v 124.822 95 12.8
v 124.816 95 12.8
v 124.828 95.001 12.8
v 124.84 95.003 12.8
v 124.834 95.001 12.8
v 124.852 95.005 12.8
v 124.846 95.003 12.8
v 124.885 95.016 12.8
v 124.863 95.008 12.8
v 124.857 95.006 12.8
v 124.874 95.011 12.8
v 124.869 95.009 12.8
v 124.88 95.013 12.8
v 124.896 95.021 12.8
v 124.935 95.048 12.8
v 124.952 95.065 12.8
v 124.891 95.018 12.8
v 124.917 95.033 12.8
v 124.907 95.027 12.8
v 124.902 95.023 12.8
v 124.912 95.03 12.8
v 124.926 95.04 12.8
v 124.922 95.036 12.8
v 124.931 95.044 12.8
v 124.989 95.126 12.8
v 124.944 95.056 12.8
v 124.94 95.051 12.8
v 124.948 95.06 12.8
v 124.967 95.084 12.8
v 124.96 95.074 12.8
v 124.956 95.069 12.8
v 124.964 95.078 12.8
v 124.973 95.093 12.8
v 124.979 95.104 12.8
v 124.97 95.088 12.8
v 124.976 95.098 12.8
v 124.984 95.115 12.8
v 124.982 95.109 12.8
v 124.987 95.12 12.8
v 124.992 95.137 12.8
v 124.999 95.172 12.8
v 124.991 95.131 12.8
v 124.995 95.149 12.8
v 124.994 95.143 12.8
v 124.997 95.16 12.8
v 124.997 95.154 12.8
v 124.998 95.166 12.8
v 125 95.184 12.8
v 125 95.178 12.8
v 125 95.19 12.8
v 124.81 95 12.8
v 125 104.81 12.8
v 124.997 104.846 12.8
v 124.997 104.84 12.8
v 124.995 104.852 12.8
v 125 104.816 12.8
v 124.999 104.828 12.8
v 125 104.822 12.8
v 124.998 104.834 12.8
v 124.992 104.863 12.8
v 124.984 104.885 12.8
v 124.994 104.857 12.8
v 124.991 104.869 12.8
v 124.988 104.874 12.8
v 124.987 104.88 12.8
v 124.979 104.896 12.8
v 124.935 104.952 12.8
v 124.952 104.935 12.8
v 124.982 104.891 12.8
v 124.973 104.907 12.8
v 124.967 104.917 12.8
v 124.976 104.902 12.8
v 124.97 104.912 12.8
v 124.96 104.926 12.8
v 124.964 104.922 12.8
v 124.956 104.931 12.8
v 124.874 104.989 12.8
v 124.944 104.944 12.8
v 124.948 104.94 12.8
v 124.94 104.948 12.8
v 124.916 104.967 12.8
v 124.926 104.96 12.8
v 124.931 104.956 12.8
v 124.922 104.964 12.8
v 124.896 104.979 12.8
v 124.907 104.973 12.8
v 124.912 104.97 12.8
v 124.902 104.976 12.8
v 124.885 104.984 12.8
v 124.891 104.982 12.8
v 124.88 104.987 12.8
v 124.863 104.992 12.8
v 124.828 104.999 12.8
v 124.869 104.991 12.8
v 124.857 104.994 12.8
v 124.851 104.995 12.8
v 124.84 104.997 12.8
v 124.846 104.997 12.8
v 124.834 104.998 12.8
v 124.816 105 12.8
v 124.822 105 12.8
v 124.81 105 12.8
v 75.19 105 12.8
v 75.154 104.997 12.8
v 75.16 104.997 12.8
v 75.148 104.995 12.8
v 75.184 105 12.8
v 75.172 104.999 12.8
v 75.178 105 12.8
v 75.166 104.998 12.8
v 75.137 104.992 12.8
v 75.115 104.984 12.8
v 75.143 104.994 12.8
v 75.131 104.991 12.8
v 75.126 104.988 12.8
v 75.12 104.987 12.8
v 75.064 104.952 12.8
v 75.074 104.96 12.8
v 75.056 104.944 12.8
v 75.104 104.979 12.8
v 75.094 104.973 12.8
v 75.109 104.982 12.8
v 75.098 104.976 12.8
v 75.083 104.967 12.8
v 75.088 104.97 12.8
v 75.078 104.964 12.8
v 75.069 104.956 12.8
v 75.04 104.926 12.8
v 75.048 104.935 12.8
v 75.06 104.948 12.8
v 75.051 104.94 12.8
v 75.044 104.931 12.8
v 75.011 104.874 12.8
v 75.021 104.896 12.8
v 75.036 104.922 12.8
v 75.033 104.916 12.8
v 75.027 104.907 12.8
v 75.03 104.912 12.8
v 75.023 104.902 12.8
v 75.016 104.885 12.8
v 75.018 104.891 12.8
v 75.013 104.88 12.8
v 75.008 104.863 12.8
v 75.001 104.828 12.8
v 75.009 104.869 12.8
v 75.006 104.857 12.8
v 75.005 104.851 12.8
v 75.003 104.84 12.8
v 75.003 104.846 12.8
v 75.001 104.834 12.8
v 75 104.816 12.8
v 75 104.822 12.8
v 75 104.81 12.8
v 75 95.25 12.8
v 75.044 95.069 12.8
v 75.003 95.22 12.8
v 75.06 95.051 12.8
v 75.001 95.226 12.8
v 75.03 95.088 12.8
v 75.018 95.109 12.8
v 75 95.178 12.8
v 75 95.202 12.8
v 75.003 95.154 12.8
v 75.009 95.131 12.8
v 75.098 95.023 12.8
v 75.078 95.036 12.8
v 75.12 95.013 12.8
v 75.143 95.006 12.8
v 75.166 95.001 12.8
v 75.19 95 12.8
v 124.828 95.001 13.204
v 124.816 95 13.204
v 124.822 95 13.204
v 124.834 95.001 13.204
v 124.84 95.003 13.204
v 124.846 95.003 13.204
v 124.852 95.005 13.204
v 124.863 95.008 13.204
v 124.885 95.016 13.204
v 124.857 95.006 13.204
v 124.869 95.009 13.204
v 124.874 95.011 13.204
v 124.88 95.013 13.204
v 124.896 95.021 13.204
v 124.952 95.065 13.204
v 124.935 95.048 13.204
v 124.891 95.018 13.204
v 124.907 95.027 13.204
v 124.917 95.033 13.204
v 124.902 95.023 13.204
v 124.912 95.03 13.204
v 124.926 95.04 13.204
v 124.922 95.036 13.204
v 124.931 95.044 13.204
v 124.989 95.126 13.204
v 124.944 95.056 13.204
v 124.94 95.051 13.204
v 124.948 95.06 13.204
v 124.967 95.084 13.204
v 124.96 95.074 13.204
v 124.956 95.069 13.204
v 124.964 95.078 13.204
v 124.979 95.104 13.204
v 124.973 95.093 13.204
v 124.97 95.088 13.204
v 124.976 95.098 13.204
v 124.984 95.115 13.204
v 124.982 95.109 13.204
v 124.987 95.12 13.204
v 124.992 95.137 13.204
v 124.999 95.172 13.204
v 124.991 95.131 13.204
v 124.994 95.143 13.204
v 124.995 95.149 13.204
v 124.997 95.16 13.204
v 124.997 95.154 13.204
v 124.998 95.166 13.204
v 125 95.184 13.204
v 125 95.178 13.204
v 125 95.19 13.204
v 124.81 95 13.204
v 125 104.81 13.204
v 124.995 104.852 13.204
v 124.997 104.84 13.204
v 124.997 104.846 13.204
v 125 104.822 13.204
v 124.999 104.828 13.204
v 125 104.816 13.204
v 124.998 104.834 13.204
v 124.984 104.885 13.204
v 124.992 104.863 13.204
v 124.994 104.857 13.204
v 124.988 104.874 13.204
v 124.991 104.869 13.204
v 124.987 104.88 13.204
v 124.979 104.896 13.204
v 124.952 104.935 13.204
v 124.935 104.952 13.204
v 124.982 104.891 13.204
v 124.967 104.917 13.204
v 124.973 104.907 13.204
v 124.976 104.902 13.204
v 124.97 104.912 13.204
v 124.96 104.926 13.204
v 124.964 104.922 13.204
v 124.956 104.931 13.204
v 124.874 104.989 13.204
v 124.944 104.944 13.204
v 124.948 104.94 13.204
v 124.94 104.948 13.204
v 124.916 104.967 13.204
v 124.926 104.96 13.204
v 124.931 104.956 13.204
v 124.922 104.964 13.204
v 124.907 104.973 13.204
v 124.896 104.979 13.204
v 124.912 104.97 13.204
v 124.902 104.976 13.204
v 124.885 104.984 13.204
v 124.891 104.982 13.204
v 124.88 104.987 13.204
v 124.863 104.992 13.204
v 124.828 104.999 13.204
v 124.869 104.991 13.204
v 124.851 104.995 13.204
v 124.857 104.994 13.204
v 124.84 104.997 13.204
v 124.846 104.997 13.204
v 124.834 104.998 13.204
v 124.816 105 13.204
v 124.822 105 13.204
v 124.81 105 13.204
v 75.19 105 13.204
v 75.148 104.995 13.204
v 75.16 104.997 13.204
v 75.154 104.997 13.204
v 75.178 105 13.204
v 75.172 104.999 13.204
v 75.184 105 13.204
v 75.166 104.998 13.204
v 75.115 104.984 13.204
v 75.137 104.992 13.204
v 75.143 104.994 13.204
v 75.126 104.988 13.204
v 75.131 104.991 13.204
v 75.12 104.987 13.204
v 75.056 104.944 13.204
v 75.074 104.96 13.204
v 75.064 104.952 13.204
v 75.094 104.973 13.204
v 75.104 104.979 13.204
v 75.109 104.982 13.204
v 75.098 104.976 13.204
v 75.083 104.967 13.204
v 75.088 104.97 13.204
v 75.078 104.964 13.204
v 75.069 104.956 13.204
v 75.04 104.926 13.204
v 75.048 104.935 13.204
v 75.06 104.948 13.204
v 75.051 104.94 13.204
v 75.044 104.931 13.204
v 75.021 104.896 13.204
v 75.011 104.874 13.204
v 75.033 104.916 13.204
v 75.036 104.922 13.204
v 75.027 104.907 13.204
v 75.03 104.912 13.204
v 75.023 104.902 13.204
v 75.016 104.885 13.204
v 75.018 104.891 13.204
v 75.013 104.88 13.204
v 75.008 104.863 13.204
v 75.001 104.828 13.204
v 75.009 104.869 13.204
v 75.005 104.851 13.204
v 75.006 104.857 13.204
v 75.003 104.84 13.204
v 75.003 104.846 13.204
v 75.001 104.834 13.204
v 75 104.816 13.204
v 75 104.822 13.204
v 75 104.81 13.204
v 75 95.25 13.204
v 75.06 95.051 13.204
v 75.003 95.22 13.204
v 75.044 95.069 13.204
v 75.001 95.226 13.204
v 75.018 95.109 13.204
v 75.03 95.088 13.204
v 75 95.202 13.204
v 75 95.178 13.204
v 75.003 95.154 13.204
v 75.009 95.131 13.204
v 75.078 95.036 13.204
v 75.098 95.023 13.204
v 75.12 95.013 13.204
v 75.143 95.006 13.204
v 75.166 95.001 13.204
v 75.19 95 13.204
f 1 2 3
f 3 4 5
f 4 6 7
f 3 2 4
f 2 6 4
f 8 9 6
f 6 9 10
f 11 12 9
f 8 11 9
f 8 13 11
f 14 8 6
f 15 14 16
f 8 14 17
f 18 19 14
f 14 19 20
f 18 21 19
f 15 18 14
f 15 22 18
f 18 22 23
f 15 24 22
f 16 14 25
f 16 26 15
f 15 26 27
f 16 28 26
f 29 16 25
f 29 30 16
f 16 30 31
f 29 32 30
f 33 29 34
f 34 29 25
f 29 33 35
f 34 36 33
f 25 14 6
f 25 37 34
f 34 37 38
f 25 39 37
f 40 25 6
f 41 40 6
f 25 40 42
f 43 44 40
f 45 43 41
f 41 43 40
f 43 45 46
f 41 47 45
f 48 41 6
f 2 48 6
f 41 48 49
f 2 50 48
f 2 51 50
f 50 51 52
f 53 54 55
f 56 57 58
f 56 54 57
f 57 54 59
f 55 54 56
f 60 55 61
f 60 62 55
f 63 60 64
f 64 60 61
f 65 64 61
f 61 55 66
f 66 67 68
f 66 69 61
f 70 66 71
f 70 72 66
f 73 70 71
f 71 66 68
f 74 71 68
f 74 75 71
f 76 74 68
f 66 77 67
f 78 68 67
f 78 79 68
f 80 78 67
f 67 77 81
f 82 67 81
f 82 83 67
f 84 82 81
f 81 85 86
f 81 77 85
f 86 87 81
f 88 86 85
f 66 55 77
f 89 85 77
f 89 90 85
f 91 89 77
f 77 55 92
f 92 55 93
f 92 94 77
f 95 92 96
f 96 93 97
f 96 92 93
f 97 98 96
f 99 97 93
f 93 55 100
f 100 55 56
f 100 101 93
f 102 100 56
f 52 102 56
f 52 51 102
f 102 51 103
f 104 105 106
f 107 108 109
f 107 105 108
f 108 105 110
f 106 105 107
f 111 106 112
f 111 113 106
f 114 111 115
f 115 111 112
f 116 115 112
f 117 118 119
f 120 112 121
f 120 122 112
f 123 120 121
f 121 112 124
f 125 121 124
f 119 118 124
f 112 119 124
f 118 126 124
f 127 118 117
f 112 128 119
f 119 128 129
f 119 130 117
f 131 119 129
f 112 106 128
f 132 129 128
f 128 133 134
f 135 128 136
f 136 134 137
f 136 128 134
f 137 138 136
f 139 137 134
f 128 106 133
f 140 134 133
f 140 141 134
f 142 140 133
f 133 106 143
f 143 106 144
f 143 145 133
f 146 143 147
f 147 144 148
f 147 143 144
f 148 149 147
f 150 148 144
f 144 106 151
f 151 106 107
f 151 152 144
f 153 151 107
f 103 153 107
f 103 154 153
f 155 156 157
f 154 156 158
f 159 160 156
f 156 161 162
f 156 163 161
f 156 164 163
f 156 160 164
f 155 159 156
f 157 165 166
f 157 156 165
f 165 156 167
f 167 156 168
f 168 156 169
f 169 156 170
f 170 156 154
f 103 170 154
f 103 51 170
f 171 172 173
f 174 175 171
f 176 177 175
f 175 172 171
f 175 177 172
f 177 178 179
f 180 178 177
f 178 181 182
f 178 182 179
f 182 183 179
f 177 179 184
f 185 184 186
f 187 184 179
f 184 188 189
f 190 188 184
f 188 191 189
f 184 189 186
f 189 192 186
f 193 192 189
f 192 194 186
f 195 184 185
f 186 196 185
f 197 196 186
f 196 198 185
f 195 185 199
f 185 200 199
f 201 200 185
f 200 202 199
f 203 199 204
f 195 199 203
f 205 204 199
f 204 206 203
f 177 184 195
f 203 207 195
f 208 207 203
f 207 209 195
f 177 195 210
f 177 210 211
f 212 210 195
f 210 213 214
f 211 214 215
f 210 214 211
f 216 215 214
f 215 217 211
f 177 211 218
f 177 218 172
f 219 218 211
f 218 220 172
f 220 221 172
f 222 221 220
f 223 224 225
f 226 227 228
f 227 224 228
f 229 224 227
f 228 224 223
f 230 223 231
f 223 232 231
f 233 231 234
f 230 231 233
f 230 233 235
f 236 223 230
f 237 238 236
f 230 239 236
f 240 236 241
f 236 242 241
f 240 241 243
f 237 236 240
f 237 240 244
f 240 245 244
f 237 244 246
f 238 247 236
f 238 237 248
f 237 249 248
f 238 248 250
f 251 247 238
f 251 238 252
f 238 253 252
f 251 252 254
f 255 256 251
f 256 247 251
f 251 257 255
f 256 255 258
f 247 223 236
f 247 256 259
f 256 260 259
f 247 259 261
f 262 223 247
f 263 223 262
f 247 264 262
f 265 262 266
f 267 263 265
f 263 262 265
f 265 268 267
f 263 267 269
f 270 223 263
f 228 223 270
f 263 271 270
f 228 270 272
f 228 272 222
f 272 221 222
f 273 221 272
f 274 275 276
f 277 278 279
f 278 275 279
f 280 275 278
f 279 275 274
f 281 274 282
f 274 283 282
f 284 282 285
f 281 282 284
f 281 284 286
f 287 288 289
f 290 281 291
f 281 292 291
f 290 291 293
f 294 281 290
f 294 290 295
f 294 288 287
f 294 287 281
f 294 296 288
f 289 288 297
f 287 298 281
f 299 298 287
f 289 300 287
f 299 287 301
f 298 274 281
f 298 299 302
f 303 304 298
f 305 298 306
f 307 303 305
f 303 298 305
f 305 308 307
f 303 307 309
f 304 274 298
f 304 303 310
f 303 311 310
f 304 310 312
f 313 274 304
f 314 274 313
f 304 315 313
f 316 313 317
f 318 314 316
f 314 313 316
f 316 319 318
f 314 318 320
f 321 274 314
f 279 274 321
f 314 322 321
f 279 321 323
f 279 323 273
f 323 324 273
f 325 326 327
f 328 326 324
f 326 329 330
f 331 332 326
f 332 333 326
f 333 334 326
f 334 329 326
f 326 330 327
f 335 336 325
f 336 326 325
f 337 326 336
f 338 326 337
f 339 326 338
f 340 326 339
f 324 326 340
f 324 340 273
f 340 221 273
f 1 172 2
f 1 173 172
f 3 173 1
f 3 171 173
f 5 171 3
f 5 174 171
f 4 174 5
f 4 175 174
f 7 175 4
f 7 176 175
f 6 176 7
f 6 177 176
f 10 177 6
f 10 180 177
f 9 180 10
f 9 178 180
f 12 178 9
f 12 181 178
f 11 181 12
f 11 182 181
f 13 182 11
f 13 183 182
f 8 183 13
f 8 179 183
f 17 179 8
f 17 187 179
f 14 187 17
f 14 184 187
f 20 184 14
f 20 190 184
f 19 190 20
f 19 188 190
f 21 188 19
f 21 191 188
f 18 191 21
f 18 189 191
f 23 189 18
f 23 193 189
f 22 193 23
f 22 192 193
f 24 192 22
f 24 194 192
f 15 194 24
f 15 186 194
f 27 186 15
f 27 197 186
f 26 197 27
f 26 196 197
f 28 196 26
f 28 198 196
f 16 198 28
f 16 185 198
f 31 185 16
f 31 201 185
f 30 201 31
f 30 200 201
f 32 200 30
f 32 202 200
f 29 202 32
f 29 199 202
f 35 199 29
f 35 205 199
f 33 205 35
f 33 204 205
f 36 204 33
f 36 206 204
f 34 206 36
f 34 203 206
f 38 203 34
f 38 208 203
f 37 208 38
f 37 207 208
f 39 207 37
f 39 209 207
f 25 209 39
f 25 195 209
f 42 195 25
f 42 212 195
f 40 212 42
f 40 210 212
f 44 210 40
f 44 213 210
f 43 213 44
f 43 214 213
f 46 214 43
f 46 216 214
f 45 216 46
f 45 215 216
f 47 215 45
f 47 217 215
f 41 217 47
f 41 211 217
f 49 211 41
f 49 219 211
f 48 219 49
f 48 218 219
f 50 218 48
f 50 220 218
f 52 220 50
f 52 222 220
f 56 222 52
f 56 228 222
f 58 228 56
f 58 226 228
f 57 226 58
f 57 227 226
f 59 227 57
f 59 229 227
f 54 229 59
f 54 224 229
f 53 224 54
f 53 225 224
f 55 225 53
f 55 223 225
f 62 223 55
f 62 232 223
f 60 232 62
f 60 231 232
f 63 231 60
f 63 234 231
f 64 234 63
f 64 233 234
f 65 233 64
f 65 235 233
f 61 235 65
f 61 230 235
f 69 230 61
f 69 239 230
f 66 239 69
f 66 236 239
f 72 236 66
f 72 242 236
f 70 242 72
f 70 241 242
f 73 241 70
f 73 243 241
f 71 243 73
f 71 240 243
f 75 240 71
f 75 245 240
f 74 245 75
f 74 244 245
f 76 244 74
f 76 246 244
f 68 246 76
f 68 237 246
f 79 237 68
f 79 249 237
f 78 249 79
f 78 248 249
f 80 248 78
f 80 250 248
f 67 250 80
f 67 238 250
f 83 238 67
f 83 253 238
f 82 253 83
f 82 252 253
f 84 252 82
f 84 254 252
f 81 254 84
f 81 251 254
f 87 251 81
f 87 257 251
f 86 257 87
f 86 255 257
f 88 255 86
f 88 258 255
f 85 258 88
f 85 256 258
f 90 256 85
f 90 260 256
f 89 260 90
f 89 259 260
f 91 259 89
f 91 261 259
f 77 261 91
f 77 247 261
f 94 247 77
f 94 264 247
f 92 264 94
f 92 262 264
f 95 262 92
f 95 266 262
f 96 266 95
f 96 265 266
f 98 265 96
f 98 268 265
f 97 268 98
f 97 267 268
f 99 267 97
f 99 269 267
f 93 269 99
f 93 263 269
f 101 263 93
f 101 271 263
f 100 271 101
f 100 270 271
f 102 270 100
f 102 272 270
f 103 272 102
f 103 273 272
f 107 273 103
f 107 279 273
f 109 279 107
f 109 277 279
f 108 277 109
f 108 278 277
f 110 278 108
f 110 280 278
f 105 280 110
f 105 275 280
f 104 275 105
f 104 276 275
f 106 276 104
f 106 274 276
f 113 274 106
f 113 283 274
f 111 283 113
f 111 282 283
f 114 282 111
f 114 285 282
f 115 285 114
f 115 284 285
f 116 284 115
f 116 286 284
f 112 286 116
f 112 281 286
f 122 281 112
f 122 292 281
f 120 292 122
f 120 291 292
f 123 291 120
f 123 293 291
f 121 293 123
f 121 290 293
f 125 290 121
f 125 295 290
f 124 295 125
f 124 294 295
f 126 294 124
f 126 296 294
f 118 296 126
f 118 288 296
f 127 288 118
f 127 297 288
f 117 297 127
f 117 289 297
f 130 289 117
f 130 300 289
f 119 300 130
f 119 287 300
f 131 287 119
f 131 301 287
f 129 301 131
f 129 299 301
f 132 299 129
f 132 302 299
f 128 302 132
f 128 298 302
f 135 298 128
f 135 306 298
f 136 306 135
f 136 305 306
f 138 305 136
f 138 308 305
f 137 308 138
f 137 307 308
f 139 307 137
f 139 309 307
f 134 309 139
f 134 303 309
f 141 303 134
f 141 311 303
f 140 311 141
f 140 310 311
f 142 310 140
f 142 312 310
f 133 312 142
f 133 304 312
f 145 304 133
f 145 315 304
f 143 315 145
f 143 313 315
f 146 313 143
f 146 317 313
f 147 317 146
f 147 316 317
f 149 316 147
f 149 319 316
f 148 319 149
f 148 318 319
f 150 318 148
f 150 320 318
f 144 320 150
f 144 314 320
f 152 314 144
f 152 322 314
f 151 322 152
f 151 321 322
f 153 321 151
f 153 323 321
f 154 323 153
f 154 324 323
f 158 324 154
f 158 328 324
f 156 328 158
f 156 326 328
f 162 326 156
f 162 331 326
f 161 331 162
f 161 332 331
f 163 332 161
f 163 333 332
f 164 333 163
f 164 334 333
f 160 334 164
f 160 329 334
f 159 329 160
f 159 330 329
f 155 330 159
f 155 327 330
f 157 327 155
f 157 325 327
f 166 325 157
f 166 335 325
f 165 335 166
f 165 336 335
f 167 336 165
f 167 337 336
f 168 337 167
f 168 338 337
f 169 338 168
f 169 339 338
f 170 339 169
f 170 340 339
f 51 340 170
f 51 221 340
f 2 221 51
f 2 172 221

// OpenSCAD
module drawBasicShape(x1, y1, x2, y2, width)
{
	length = sqrt((x1-x2)*(x1-x2) + (y1-y2)*(y1-y2));
	if (width!=0.0) {
		square(size = [width, length], center = false);
		translate([width/2.0, 0, 0]) circle(d=width);
		translate([width/2.0, length, 0]) circle(d=width);
	}
}

module translateAndRotate(x1, y1, x2, y2, width)
{
	if (width != 0.0) {
		angle = atan((y2-y1)/(x2-x1)) +270;
		if (x2>=x1) {
			translate([x1, y1, 0.0]) rotate([0.0, 0.0, angle]) translate([-width/2.0, 0.0, 0.0]) scale([1.0, 1.0, 1.0]) drawBasicShape(x1, y1, x2, y2, width);
		}
		else {
			translate([x1, y1, 0.0]) rotate([0.0, 0.0, angle+180]) translate([-width/2.0, 0.0, 0.0]) scale([1.0, 1.0, 1.0]) drawBasicShape(x1, y1, x2, y2, width);		}
	}
}

$fn=50;

points31 = [
[75.77800000, 95.77800000, 0.00000000],
[124.22200000, 95.77800000, 0.37999672],
[124.22200000, 104.22200000, 0.37997788],
[75.77800000, 104.22200000, 0.37999548],
[75.77800000, 95.83800000, 0.37998140],
[75.48400000, 95.48400000, 0.00000000],
[124.51600000, 95.48400000, 0.37999746],
[124.51600000, 104.51600000, 0.37998977],
[75.48400000, 104.51600000, 0.37999868],
[75.48400000, 95.54400000, 0.37998644],
[75.19000000, 95.19000000, 0.00000000],
[124.81000000, 95.19000000, 0.38000060],
[124.81000000, 104.81000000, 0.38000021],
[75.19000000, 104.81000000, 0.37999939],
[75.19000000, 95.25000000, 0.38000344],
[75.53600000, 95.39000000, 0.00000000],
[76.11100000, 95.94600000, 0.00000000],
[75.94600000, 96.11100000, 0.37935605],
[75.94600000, 96.52800000, 0.38015610],
[76.52800000, 95.94600000, 0.37989934],
[76.94500000, 95.94600000, 0.38001190],
[75.94600000, 96.94500000, 0.37994651],
[75.94600000, 97.36200000, 0.38015610],
[77.36200000, 95.94600000, 0.37996589],
[77.77900000, 95.94600000, 0.38015610],
[75.94600000, 97.77900000, 0.37999966],
[75.94600000, 98.19600000, 0.38001190],
[78.19600000, 95.94600000, 0.38000201],
[78.61300000, 95.94600000, 0.38015610],
[75.94600000, 98.61300000, 0.38000362],
[75.94600000, 99.03000000, 0.38015610],
[79.03000000, 95.94600000, 0.38001859],
[79.44700000, 95.94600000, 0.38001190],
[75.94600000, 99.44700000, 0.38001785],
[75.94600000, 99.86400000, 0.38001190],
[79.86400000, 95.94600000, 0.38002811],
[80.28100000, 95.94600000, 0.38001190],
[75.94600000, 100.28100000, 0.38002660],
[75.94600000, 100.69800000, 0.38015610],
[80.69800000, 95.94600000, 0.38002534],
[81.11500000, 95.94600000, 0.38001190],
[75.94600000, 101.11500000, 0.38003252],
[75.94600000, 101.53300000, 0.37930814],
[81.53300000, 95.94600000, 0.37997836],
[81.95000000, 95.94600000, 0.38001190],
[75.94600000, 101.95000000, 0.37998780],
[75.94600000, 102.36700000, 0.38001190],
[82.36700000, 95.94600000, 0.37998939],
[82.78400000, 95.94600000, 0.38001190],
[75.94600000, 102.78400000, 0.37999079],
[75.94600000, 103.20100000, 0.38001190],
[83.20100000, 95.94600000, 0.37999203],
[83.61800000, 95.94600000, 0.38015610],
[75.94600000, 103.61800000, 0.37999314],
[75.95600000, 104.02400000, 0.38048727],
[84.03500000, 95.94600000, 0.38000275],
[84.45200000, 95.94600000, 0.38001190],
[76.34400000, 104.05400000, 0.38000754],
[76.76100000, 104.05400000, 0.38001190],
[84.86900000, 95.94600000, 0.38000229],
[85.28600000, 95.94600000, 0.38001190],
[77.17800000, 104.05400000, 0.38000754],
[77.59500000, 104.05400000, 0.38001190],
[85.70300000, 95.94600000, 0.38000229],
[86.12000000, 95.94600000, 0.38015610],
[78.01200000, 104.05400000, 0.38000229],
[78.42900000, 104.05400000, 0.38001190],
[86.53700000, 95.94600000, 0.38000754],
[86.95400000, 95.94600000, 0.38001190],
[78.84600000, 104.05400000, 0.38000229],
[79.26300000, 104.05400000, 0.38001190],
[87.37100000, 95.94600000, 0.38000754],
[87.78900000, 95.94600000, 0.37930814],
[79.68000000, 104.05400000, 0.37998415],
[80.09700000, 104.05400000, 0.38015610],
[88.20600000, 95.94600000, 0.37998415],
[88.62300000, 95.94600000, 0.38001190],
[80.51500000, 104.05400000, 0.38000754],
[80.93200000, 104.05400000, 0.38001190],
[89.04000000, 95.94600000, 0.38000229],
[89.45700000, 95.94600000, 0.38001190],
[81.34900000, 104.05400000, 0.38000754],
[81.76600000, 104.05400000, 0.38001190],
[89.87400000, 95.94600000, 0.38000229],
[90.29100000, 95.94600000, 0.38015610],
[82.18300000, 104.05400000, 0.38000229],
[82.60000000, 104.05400000, 0.38001190],
[90.70800000, 95.94600000, 0.38000754],
[91.12500000, 95.94600000, 0.38001190],
[83.01700000, 104.05400000, 0.38000229],
[83.43400000, 104.05400000, 0.38001190],
[91.54200000, 95.94600000, 0.38000754],
[91.95900000, 95.94600000, 0.38001190],
[83.85100000, 104.05400000, 0.38000229],
[84.26800000, 104.05400000, 0.38015610],
[92.37600000, 95.94600000, 0.38000229],
[92.79300000, 95.94600000, 0.38001190],
[84.68500000, 104.05400000, 0.38000229],
[85.10200000, 104.05400000, 0.38015610],
[93.21000000, 95.94600000, 0.38000229],
[93.62700000, 95.94600000, 0.38001190],
[85.51900000, 104.05400000, 0.38000754],
[85.93600000, 104.05400000, 0.38001190],
[94.04400000, 95.94600000, 0.38000229],
[94.46200000, 95.94600000, 0.37945200],
[86.35300000, 104.05400000, 0.37998415],
[86.77000000, 104.05400000, 0.38001190],
[94.87900000, 95.94600000, 0.37998415],
[95.29600000, 95.94600000, 0.38015610],
[87.18800000, 104.05400000, 0.38000229],
[87.60500000, 104.05400000, 0.38001190],
[95.71300000, 95.94600000, 0.38000754],
[96.13000000, 95.94600000, 0.38001190],
[88.02200000, 104.05400000, 0.38000229],
[88.43900000, 104.05400000, 0.38001190],
[96.54700000, 95.94600000, 0.38000754],
[96.96400000, 95.94600000, 0.38001190],
[88.85600000, 104.05400000, 0.38000229],
[89.27300000, 104.05400000, 0.38015610],
[97.38100000, 95.94600000, 0.38000229],
[97.79800000, 95.94600000, 0.38001190],
[89.69000000, 104.05400000, 0.38000754],
[90.10700000, 104.05400000, 0.38001190],
[98.21500000, 95.94600000, 0.38000229],
[98.63200000, 95.94600000, 0.38001190],
[90.52400000, 104.05400000, 0.38000754],
[90.94100000, 104.05400000, 0.38001190],
[99.04900000, 95.94600000, 0.38000229],
[99.46600000, 95.94600000, 0.38015610],
[91.35800000, 104.05400000, 0.38000229],
[91.77500000, 104.05400000, 0.38001190],
[99.88300000, 95.94600000, 0.38000754],
[100.30000000, 95.94600000, 0.38001190],
[92.19200000, 104.05400000, 0.38000229],
[92.60900000, 104.05400000, 0.38001190],
[100.71800000, 95.94600000, 0.37998940],
[101.13500000, 95.94600000, 0.38001190],
[93.02600000, 104.05400000, 0.37998415],
[93.44400000, 104.05400000, 0.37945200],
[101.55200000, 95.94600000, 0.38000229],
[101.96900000, 95.94600000, 0.38001190],
[93.86100000, 104.05400000, 0.38000754],
[94.27800000, 104.05400000, 0.38001190],
[102.38600000, 95.94600000, 0.38000229],
[102.80300000, 95.94600000, 0.38001190],
[94.69500000, 104.05400000, 0.38000754],
[95.11200000, 104.05400000, 0.38001190],
[103.22000000, 95.94600000, 0.38000229],
[103.63700000, 95.94600000, 0.38015610],
[95.52900000, 104.05400000, 0.38000229],
[95.94600000, 104.05400000, 0.38001190],
[104.05400000, 95.94600000, 0.38000754],
[104.47100000, 95.94600000, 0.38001190],
[96.36300000, 104.05400000, 0.38000229],
[96.78000000, 104.05400000, 0.38001190],
[104.88800000, 95.94600000, 0.38000754],
[105.30500000, 95.94600000, 0.38001190],
[97.19700000, 104.05400000, 0.38000229],
[97.61400000, 104.05400000, 0.38015610],
[105.72200000, 95.94600000, 0.38000229],
[106.13900000, 95.94600000, 0.38001190],
[98.03100000, 104.05400000, 0.38000754],
[98.44800000, 104.05400000, 0.38001190],
[106.55600000, 95.94600000, 0.38000229],
[106.97300000, 95.94600000, 0.38001190],
[98.86500000, 104.05400000, 0.38000754],
[99.28200000, 104.05400000, 0.38001190],
[107.39100000, 95.94600000, 0.37998415],
[107.80800000, 95.94600000, 0.38015610],
[99.69900000, 104.05400000, 0.37998415],
[100.11700000, 104.05400000, 0.37930814],
[108.22500000, 95.94600000, 0.38000754],
[108.64200000, 95.94600000, 0.38001190],
[100.53400000, 104.05400000, 0.38000229],
[100.95100000, 104.05400000, 0.38001190],
[109.05900000, 95.94600000, 0.38000754],
[109.47600000, 95.94600000, 0.38001190],
[101.36800000, 104.05400000, 0.38000229],
[101.78500000, 104.05400000, 0.38015610],
[109.89300000, 95.94600000, 0.38000229],
[110.31000000, 95.94600000, 0.38001190],
[102.20200000, 104.05400000, 0.38000754],
[102.61900000, 104.05400000, 0.38001190],
[110.72700000, 95.94600000, 0.38000229],
[111.14400000, 95.94600000, 0.38001190],
[103.03600000, 104.05400000, 0.38000754],
[103.45300000, 104.05400000, 0.38001190],
[111.56100000, 95.94600000, 0.38000229],
[111.97800000, 95.94600000, 0.38015610],
[103.87000000, 104.05400000, 0.38000229],
[104.28700000, 104.05400000, 0.38001190],
[112.39500000, 95.94600000, 0.38000754],
[112.81200000, 95.94600000, 0.38001190],
[104.70400000, 104.05400000, 0.38000229],
[105.12100000, 104.05400000, 0.38001190],
[113.22900000, 95.94600000, 0.38000754],
[113.64700000, 95.94600000, 0.37930814],
[105.53800000, 104.05400000, 0.37998415],
[105.95500000, 104.05400000, 0.38015610],
[114.06400000, 95.94600000, 0.37998415],
[114.48100000, 95.94600000, 0.38001190],
[106.37300000, 104.05400000, 0.38000754],
[106.79000000, 104.05400000, 0.38001190],
[114.89800000, 95.94600000, 0.38000229],
[115.31500000, 95.94600000, 0.38001190],
[107.20700000, 104.05400000, 0.38000754],
[107.62400000, 104.05400000, 0.38001190],
[115.73200000, 95.94600000, 0.38000229],
[116.14900000, 95.94600000, 0.38015610],
[108.04100000, 104.05400000, 0.38000229],
[108.45800000, 104.05400000, 0.38001190],
[116.56600000, 95.94600000, 0.38000754],
[116.98300000, 95.94600000, 0.38001190],
[108.87500000, 104.05400000, 0.38000229],
[109.29200000, 104.05400000, 0.38001190],
[117.40000000, 95.94600000, 0.38000754],
[117.81700000, 95.94600000, 0.38001190],
[109.70900000, 104.05400000, 0.38000229],
[110.12600000, 104.05400000, 0.38015610],
[118.23400000, 95.94600000, 0.38000229],
[118.65100000, 95.94600000, 0.38001190],
[110.54300000, 104.05400000, 0.38000754],
[110.96000000, 104.05400000, 0.38001190],
[119.06800000, 95.94600000, 0.38000229],
[119.48500000, 95.94600000, 0.38001190],
[111.37700000, 104.05400000, 0.38000754],
[111.79400000, 104.05400000, 0.38001190],
[119.90200000, 95.94600000, 0.38000229],
[120.32000000, 95.94600000, 0.37945200],
[112.21100000, 104.05400000, 0.37998415],
[112.62900000, 104.05400000, 0.37930814],
[120.73700000, 95.94600000, 0.38000754],
[121.15400000, 95.94600000, 0.38001190],
[113.04600000, 104.05400000, 0.38000229],
[113.46300000, 104.05400000, 0.38001190],
[121.57100000, 95.94600000, 0.38000754],
[121.98800000, 95.94600000, 0.38001190],
[113.88000000, 104.05400000, 0.38000229],
[114.29700000, 104.05400000, 0.38015610],
[122.40500000, 95.94600000, 0.38000229],
[122.82200000, 95.94600000, 0.38001190],
[114.71400000, 104.05400000, 0.38000754],
[115.13100000, 104.05400000, 0.38001190],
[123.23900000, 95.94600000, 0.38000229],
[123.65600000, 95.94600000, 0.38001190],
[115.54800000, 104.05400000, 0.38000754],
[115.96500000, 104.05400000, 0.38001190],
[124.04400000, 95.97500000, 0.37998455],
[124.05400000, 96.38200000, 0.37976376],
[116.38200000, 104.05400000, 0.37999868],
[116.79900000, 104.05400000, 0.38001190],
[124.05400000, 96.79900000, 0.37999789],
[124.05400000, 97.21600000, 0.38001190],
[117.21600000, 104.05400000, 0.37999079],
[117.63300000, 104.05400000, 0.38001190],
[124.05400000, 97.63300000, 0.37998939],
[124.05400000, 98.05000000, 0.38015610],
[118.05000000, 104.05400000, 0.37998072],
[118.46700000, 104.05400000, 0.38015610],
[124.05400000, 98.46700000, 0.37997836],
[124.05400000, 98.88400000, 0.38001190],
[118.88400000, 104.05400000, 0.37997562],
[119.30200000, 104.05400000, 0.37945200],
[124.05400000, 99.30200000, 0.38002534],
[124.05400000, 99.71900000, 0.38001190],
[119.71900000, 104.05400000, 0.38003640],
[120.13600000, 104.05400000, 0.38001190],
[124.05400000, 100.13600000, 0.38002811],
[124.05400000, 100.55300000, 0.38001190],
[120.55300000, 104.05400000, 0.38002999],
[120.97000000, 104.05400000, 0.38001190],
[124.05400000, 100.97000000, 0.38003238],
[124.05400000, 101.38700000, 0.38001190],
[121.38700000, 104.05400000, 0.38001957],
[121.80400000, 104.05400000, 0.38001190],
[124.05400000, 101.80400000, 0.38002091],
[124.05400000, 102.22100000, 0.38001190],
[122.22100000, 104.05400000, 0.38002285],
[122.63800000, 104.05400000, 0.38001190],
[124.05400000, 102.63800000, 0.37999592],
[124.05400000, 103.05500000, 0.38001190],
[123.05500000, 104.05400000, 0.37998907],
[123.47200000, 104.05400000, 0.38001190],
[124.05400000, 103.47200000, 0.37997240],
[124.05400000, 103.88900000, 0.38001190],
[123.88900000, 104.05400000, 0.37961375],
];

translate([0.0, 0.0, 12.80000000]) {
	linear_extrude(height = 0.40400000, center = false, convexity = 10, twist = 0) {
		union() {
			for( i=[0:len(points31)-2] ){ 
				x1 = points31[i][0];
				y1 = points31[i][1];
				x2 = points31[i+1][0];
				y2 = points31[i+1][1];
				width = points31[i+1][2];
				translateAndRotate(x1, y1, x2, y2, width);
			}
		}
	}
}
